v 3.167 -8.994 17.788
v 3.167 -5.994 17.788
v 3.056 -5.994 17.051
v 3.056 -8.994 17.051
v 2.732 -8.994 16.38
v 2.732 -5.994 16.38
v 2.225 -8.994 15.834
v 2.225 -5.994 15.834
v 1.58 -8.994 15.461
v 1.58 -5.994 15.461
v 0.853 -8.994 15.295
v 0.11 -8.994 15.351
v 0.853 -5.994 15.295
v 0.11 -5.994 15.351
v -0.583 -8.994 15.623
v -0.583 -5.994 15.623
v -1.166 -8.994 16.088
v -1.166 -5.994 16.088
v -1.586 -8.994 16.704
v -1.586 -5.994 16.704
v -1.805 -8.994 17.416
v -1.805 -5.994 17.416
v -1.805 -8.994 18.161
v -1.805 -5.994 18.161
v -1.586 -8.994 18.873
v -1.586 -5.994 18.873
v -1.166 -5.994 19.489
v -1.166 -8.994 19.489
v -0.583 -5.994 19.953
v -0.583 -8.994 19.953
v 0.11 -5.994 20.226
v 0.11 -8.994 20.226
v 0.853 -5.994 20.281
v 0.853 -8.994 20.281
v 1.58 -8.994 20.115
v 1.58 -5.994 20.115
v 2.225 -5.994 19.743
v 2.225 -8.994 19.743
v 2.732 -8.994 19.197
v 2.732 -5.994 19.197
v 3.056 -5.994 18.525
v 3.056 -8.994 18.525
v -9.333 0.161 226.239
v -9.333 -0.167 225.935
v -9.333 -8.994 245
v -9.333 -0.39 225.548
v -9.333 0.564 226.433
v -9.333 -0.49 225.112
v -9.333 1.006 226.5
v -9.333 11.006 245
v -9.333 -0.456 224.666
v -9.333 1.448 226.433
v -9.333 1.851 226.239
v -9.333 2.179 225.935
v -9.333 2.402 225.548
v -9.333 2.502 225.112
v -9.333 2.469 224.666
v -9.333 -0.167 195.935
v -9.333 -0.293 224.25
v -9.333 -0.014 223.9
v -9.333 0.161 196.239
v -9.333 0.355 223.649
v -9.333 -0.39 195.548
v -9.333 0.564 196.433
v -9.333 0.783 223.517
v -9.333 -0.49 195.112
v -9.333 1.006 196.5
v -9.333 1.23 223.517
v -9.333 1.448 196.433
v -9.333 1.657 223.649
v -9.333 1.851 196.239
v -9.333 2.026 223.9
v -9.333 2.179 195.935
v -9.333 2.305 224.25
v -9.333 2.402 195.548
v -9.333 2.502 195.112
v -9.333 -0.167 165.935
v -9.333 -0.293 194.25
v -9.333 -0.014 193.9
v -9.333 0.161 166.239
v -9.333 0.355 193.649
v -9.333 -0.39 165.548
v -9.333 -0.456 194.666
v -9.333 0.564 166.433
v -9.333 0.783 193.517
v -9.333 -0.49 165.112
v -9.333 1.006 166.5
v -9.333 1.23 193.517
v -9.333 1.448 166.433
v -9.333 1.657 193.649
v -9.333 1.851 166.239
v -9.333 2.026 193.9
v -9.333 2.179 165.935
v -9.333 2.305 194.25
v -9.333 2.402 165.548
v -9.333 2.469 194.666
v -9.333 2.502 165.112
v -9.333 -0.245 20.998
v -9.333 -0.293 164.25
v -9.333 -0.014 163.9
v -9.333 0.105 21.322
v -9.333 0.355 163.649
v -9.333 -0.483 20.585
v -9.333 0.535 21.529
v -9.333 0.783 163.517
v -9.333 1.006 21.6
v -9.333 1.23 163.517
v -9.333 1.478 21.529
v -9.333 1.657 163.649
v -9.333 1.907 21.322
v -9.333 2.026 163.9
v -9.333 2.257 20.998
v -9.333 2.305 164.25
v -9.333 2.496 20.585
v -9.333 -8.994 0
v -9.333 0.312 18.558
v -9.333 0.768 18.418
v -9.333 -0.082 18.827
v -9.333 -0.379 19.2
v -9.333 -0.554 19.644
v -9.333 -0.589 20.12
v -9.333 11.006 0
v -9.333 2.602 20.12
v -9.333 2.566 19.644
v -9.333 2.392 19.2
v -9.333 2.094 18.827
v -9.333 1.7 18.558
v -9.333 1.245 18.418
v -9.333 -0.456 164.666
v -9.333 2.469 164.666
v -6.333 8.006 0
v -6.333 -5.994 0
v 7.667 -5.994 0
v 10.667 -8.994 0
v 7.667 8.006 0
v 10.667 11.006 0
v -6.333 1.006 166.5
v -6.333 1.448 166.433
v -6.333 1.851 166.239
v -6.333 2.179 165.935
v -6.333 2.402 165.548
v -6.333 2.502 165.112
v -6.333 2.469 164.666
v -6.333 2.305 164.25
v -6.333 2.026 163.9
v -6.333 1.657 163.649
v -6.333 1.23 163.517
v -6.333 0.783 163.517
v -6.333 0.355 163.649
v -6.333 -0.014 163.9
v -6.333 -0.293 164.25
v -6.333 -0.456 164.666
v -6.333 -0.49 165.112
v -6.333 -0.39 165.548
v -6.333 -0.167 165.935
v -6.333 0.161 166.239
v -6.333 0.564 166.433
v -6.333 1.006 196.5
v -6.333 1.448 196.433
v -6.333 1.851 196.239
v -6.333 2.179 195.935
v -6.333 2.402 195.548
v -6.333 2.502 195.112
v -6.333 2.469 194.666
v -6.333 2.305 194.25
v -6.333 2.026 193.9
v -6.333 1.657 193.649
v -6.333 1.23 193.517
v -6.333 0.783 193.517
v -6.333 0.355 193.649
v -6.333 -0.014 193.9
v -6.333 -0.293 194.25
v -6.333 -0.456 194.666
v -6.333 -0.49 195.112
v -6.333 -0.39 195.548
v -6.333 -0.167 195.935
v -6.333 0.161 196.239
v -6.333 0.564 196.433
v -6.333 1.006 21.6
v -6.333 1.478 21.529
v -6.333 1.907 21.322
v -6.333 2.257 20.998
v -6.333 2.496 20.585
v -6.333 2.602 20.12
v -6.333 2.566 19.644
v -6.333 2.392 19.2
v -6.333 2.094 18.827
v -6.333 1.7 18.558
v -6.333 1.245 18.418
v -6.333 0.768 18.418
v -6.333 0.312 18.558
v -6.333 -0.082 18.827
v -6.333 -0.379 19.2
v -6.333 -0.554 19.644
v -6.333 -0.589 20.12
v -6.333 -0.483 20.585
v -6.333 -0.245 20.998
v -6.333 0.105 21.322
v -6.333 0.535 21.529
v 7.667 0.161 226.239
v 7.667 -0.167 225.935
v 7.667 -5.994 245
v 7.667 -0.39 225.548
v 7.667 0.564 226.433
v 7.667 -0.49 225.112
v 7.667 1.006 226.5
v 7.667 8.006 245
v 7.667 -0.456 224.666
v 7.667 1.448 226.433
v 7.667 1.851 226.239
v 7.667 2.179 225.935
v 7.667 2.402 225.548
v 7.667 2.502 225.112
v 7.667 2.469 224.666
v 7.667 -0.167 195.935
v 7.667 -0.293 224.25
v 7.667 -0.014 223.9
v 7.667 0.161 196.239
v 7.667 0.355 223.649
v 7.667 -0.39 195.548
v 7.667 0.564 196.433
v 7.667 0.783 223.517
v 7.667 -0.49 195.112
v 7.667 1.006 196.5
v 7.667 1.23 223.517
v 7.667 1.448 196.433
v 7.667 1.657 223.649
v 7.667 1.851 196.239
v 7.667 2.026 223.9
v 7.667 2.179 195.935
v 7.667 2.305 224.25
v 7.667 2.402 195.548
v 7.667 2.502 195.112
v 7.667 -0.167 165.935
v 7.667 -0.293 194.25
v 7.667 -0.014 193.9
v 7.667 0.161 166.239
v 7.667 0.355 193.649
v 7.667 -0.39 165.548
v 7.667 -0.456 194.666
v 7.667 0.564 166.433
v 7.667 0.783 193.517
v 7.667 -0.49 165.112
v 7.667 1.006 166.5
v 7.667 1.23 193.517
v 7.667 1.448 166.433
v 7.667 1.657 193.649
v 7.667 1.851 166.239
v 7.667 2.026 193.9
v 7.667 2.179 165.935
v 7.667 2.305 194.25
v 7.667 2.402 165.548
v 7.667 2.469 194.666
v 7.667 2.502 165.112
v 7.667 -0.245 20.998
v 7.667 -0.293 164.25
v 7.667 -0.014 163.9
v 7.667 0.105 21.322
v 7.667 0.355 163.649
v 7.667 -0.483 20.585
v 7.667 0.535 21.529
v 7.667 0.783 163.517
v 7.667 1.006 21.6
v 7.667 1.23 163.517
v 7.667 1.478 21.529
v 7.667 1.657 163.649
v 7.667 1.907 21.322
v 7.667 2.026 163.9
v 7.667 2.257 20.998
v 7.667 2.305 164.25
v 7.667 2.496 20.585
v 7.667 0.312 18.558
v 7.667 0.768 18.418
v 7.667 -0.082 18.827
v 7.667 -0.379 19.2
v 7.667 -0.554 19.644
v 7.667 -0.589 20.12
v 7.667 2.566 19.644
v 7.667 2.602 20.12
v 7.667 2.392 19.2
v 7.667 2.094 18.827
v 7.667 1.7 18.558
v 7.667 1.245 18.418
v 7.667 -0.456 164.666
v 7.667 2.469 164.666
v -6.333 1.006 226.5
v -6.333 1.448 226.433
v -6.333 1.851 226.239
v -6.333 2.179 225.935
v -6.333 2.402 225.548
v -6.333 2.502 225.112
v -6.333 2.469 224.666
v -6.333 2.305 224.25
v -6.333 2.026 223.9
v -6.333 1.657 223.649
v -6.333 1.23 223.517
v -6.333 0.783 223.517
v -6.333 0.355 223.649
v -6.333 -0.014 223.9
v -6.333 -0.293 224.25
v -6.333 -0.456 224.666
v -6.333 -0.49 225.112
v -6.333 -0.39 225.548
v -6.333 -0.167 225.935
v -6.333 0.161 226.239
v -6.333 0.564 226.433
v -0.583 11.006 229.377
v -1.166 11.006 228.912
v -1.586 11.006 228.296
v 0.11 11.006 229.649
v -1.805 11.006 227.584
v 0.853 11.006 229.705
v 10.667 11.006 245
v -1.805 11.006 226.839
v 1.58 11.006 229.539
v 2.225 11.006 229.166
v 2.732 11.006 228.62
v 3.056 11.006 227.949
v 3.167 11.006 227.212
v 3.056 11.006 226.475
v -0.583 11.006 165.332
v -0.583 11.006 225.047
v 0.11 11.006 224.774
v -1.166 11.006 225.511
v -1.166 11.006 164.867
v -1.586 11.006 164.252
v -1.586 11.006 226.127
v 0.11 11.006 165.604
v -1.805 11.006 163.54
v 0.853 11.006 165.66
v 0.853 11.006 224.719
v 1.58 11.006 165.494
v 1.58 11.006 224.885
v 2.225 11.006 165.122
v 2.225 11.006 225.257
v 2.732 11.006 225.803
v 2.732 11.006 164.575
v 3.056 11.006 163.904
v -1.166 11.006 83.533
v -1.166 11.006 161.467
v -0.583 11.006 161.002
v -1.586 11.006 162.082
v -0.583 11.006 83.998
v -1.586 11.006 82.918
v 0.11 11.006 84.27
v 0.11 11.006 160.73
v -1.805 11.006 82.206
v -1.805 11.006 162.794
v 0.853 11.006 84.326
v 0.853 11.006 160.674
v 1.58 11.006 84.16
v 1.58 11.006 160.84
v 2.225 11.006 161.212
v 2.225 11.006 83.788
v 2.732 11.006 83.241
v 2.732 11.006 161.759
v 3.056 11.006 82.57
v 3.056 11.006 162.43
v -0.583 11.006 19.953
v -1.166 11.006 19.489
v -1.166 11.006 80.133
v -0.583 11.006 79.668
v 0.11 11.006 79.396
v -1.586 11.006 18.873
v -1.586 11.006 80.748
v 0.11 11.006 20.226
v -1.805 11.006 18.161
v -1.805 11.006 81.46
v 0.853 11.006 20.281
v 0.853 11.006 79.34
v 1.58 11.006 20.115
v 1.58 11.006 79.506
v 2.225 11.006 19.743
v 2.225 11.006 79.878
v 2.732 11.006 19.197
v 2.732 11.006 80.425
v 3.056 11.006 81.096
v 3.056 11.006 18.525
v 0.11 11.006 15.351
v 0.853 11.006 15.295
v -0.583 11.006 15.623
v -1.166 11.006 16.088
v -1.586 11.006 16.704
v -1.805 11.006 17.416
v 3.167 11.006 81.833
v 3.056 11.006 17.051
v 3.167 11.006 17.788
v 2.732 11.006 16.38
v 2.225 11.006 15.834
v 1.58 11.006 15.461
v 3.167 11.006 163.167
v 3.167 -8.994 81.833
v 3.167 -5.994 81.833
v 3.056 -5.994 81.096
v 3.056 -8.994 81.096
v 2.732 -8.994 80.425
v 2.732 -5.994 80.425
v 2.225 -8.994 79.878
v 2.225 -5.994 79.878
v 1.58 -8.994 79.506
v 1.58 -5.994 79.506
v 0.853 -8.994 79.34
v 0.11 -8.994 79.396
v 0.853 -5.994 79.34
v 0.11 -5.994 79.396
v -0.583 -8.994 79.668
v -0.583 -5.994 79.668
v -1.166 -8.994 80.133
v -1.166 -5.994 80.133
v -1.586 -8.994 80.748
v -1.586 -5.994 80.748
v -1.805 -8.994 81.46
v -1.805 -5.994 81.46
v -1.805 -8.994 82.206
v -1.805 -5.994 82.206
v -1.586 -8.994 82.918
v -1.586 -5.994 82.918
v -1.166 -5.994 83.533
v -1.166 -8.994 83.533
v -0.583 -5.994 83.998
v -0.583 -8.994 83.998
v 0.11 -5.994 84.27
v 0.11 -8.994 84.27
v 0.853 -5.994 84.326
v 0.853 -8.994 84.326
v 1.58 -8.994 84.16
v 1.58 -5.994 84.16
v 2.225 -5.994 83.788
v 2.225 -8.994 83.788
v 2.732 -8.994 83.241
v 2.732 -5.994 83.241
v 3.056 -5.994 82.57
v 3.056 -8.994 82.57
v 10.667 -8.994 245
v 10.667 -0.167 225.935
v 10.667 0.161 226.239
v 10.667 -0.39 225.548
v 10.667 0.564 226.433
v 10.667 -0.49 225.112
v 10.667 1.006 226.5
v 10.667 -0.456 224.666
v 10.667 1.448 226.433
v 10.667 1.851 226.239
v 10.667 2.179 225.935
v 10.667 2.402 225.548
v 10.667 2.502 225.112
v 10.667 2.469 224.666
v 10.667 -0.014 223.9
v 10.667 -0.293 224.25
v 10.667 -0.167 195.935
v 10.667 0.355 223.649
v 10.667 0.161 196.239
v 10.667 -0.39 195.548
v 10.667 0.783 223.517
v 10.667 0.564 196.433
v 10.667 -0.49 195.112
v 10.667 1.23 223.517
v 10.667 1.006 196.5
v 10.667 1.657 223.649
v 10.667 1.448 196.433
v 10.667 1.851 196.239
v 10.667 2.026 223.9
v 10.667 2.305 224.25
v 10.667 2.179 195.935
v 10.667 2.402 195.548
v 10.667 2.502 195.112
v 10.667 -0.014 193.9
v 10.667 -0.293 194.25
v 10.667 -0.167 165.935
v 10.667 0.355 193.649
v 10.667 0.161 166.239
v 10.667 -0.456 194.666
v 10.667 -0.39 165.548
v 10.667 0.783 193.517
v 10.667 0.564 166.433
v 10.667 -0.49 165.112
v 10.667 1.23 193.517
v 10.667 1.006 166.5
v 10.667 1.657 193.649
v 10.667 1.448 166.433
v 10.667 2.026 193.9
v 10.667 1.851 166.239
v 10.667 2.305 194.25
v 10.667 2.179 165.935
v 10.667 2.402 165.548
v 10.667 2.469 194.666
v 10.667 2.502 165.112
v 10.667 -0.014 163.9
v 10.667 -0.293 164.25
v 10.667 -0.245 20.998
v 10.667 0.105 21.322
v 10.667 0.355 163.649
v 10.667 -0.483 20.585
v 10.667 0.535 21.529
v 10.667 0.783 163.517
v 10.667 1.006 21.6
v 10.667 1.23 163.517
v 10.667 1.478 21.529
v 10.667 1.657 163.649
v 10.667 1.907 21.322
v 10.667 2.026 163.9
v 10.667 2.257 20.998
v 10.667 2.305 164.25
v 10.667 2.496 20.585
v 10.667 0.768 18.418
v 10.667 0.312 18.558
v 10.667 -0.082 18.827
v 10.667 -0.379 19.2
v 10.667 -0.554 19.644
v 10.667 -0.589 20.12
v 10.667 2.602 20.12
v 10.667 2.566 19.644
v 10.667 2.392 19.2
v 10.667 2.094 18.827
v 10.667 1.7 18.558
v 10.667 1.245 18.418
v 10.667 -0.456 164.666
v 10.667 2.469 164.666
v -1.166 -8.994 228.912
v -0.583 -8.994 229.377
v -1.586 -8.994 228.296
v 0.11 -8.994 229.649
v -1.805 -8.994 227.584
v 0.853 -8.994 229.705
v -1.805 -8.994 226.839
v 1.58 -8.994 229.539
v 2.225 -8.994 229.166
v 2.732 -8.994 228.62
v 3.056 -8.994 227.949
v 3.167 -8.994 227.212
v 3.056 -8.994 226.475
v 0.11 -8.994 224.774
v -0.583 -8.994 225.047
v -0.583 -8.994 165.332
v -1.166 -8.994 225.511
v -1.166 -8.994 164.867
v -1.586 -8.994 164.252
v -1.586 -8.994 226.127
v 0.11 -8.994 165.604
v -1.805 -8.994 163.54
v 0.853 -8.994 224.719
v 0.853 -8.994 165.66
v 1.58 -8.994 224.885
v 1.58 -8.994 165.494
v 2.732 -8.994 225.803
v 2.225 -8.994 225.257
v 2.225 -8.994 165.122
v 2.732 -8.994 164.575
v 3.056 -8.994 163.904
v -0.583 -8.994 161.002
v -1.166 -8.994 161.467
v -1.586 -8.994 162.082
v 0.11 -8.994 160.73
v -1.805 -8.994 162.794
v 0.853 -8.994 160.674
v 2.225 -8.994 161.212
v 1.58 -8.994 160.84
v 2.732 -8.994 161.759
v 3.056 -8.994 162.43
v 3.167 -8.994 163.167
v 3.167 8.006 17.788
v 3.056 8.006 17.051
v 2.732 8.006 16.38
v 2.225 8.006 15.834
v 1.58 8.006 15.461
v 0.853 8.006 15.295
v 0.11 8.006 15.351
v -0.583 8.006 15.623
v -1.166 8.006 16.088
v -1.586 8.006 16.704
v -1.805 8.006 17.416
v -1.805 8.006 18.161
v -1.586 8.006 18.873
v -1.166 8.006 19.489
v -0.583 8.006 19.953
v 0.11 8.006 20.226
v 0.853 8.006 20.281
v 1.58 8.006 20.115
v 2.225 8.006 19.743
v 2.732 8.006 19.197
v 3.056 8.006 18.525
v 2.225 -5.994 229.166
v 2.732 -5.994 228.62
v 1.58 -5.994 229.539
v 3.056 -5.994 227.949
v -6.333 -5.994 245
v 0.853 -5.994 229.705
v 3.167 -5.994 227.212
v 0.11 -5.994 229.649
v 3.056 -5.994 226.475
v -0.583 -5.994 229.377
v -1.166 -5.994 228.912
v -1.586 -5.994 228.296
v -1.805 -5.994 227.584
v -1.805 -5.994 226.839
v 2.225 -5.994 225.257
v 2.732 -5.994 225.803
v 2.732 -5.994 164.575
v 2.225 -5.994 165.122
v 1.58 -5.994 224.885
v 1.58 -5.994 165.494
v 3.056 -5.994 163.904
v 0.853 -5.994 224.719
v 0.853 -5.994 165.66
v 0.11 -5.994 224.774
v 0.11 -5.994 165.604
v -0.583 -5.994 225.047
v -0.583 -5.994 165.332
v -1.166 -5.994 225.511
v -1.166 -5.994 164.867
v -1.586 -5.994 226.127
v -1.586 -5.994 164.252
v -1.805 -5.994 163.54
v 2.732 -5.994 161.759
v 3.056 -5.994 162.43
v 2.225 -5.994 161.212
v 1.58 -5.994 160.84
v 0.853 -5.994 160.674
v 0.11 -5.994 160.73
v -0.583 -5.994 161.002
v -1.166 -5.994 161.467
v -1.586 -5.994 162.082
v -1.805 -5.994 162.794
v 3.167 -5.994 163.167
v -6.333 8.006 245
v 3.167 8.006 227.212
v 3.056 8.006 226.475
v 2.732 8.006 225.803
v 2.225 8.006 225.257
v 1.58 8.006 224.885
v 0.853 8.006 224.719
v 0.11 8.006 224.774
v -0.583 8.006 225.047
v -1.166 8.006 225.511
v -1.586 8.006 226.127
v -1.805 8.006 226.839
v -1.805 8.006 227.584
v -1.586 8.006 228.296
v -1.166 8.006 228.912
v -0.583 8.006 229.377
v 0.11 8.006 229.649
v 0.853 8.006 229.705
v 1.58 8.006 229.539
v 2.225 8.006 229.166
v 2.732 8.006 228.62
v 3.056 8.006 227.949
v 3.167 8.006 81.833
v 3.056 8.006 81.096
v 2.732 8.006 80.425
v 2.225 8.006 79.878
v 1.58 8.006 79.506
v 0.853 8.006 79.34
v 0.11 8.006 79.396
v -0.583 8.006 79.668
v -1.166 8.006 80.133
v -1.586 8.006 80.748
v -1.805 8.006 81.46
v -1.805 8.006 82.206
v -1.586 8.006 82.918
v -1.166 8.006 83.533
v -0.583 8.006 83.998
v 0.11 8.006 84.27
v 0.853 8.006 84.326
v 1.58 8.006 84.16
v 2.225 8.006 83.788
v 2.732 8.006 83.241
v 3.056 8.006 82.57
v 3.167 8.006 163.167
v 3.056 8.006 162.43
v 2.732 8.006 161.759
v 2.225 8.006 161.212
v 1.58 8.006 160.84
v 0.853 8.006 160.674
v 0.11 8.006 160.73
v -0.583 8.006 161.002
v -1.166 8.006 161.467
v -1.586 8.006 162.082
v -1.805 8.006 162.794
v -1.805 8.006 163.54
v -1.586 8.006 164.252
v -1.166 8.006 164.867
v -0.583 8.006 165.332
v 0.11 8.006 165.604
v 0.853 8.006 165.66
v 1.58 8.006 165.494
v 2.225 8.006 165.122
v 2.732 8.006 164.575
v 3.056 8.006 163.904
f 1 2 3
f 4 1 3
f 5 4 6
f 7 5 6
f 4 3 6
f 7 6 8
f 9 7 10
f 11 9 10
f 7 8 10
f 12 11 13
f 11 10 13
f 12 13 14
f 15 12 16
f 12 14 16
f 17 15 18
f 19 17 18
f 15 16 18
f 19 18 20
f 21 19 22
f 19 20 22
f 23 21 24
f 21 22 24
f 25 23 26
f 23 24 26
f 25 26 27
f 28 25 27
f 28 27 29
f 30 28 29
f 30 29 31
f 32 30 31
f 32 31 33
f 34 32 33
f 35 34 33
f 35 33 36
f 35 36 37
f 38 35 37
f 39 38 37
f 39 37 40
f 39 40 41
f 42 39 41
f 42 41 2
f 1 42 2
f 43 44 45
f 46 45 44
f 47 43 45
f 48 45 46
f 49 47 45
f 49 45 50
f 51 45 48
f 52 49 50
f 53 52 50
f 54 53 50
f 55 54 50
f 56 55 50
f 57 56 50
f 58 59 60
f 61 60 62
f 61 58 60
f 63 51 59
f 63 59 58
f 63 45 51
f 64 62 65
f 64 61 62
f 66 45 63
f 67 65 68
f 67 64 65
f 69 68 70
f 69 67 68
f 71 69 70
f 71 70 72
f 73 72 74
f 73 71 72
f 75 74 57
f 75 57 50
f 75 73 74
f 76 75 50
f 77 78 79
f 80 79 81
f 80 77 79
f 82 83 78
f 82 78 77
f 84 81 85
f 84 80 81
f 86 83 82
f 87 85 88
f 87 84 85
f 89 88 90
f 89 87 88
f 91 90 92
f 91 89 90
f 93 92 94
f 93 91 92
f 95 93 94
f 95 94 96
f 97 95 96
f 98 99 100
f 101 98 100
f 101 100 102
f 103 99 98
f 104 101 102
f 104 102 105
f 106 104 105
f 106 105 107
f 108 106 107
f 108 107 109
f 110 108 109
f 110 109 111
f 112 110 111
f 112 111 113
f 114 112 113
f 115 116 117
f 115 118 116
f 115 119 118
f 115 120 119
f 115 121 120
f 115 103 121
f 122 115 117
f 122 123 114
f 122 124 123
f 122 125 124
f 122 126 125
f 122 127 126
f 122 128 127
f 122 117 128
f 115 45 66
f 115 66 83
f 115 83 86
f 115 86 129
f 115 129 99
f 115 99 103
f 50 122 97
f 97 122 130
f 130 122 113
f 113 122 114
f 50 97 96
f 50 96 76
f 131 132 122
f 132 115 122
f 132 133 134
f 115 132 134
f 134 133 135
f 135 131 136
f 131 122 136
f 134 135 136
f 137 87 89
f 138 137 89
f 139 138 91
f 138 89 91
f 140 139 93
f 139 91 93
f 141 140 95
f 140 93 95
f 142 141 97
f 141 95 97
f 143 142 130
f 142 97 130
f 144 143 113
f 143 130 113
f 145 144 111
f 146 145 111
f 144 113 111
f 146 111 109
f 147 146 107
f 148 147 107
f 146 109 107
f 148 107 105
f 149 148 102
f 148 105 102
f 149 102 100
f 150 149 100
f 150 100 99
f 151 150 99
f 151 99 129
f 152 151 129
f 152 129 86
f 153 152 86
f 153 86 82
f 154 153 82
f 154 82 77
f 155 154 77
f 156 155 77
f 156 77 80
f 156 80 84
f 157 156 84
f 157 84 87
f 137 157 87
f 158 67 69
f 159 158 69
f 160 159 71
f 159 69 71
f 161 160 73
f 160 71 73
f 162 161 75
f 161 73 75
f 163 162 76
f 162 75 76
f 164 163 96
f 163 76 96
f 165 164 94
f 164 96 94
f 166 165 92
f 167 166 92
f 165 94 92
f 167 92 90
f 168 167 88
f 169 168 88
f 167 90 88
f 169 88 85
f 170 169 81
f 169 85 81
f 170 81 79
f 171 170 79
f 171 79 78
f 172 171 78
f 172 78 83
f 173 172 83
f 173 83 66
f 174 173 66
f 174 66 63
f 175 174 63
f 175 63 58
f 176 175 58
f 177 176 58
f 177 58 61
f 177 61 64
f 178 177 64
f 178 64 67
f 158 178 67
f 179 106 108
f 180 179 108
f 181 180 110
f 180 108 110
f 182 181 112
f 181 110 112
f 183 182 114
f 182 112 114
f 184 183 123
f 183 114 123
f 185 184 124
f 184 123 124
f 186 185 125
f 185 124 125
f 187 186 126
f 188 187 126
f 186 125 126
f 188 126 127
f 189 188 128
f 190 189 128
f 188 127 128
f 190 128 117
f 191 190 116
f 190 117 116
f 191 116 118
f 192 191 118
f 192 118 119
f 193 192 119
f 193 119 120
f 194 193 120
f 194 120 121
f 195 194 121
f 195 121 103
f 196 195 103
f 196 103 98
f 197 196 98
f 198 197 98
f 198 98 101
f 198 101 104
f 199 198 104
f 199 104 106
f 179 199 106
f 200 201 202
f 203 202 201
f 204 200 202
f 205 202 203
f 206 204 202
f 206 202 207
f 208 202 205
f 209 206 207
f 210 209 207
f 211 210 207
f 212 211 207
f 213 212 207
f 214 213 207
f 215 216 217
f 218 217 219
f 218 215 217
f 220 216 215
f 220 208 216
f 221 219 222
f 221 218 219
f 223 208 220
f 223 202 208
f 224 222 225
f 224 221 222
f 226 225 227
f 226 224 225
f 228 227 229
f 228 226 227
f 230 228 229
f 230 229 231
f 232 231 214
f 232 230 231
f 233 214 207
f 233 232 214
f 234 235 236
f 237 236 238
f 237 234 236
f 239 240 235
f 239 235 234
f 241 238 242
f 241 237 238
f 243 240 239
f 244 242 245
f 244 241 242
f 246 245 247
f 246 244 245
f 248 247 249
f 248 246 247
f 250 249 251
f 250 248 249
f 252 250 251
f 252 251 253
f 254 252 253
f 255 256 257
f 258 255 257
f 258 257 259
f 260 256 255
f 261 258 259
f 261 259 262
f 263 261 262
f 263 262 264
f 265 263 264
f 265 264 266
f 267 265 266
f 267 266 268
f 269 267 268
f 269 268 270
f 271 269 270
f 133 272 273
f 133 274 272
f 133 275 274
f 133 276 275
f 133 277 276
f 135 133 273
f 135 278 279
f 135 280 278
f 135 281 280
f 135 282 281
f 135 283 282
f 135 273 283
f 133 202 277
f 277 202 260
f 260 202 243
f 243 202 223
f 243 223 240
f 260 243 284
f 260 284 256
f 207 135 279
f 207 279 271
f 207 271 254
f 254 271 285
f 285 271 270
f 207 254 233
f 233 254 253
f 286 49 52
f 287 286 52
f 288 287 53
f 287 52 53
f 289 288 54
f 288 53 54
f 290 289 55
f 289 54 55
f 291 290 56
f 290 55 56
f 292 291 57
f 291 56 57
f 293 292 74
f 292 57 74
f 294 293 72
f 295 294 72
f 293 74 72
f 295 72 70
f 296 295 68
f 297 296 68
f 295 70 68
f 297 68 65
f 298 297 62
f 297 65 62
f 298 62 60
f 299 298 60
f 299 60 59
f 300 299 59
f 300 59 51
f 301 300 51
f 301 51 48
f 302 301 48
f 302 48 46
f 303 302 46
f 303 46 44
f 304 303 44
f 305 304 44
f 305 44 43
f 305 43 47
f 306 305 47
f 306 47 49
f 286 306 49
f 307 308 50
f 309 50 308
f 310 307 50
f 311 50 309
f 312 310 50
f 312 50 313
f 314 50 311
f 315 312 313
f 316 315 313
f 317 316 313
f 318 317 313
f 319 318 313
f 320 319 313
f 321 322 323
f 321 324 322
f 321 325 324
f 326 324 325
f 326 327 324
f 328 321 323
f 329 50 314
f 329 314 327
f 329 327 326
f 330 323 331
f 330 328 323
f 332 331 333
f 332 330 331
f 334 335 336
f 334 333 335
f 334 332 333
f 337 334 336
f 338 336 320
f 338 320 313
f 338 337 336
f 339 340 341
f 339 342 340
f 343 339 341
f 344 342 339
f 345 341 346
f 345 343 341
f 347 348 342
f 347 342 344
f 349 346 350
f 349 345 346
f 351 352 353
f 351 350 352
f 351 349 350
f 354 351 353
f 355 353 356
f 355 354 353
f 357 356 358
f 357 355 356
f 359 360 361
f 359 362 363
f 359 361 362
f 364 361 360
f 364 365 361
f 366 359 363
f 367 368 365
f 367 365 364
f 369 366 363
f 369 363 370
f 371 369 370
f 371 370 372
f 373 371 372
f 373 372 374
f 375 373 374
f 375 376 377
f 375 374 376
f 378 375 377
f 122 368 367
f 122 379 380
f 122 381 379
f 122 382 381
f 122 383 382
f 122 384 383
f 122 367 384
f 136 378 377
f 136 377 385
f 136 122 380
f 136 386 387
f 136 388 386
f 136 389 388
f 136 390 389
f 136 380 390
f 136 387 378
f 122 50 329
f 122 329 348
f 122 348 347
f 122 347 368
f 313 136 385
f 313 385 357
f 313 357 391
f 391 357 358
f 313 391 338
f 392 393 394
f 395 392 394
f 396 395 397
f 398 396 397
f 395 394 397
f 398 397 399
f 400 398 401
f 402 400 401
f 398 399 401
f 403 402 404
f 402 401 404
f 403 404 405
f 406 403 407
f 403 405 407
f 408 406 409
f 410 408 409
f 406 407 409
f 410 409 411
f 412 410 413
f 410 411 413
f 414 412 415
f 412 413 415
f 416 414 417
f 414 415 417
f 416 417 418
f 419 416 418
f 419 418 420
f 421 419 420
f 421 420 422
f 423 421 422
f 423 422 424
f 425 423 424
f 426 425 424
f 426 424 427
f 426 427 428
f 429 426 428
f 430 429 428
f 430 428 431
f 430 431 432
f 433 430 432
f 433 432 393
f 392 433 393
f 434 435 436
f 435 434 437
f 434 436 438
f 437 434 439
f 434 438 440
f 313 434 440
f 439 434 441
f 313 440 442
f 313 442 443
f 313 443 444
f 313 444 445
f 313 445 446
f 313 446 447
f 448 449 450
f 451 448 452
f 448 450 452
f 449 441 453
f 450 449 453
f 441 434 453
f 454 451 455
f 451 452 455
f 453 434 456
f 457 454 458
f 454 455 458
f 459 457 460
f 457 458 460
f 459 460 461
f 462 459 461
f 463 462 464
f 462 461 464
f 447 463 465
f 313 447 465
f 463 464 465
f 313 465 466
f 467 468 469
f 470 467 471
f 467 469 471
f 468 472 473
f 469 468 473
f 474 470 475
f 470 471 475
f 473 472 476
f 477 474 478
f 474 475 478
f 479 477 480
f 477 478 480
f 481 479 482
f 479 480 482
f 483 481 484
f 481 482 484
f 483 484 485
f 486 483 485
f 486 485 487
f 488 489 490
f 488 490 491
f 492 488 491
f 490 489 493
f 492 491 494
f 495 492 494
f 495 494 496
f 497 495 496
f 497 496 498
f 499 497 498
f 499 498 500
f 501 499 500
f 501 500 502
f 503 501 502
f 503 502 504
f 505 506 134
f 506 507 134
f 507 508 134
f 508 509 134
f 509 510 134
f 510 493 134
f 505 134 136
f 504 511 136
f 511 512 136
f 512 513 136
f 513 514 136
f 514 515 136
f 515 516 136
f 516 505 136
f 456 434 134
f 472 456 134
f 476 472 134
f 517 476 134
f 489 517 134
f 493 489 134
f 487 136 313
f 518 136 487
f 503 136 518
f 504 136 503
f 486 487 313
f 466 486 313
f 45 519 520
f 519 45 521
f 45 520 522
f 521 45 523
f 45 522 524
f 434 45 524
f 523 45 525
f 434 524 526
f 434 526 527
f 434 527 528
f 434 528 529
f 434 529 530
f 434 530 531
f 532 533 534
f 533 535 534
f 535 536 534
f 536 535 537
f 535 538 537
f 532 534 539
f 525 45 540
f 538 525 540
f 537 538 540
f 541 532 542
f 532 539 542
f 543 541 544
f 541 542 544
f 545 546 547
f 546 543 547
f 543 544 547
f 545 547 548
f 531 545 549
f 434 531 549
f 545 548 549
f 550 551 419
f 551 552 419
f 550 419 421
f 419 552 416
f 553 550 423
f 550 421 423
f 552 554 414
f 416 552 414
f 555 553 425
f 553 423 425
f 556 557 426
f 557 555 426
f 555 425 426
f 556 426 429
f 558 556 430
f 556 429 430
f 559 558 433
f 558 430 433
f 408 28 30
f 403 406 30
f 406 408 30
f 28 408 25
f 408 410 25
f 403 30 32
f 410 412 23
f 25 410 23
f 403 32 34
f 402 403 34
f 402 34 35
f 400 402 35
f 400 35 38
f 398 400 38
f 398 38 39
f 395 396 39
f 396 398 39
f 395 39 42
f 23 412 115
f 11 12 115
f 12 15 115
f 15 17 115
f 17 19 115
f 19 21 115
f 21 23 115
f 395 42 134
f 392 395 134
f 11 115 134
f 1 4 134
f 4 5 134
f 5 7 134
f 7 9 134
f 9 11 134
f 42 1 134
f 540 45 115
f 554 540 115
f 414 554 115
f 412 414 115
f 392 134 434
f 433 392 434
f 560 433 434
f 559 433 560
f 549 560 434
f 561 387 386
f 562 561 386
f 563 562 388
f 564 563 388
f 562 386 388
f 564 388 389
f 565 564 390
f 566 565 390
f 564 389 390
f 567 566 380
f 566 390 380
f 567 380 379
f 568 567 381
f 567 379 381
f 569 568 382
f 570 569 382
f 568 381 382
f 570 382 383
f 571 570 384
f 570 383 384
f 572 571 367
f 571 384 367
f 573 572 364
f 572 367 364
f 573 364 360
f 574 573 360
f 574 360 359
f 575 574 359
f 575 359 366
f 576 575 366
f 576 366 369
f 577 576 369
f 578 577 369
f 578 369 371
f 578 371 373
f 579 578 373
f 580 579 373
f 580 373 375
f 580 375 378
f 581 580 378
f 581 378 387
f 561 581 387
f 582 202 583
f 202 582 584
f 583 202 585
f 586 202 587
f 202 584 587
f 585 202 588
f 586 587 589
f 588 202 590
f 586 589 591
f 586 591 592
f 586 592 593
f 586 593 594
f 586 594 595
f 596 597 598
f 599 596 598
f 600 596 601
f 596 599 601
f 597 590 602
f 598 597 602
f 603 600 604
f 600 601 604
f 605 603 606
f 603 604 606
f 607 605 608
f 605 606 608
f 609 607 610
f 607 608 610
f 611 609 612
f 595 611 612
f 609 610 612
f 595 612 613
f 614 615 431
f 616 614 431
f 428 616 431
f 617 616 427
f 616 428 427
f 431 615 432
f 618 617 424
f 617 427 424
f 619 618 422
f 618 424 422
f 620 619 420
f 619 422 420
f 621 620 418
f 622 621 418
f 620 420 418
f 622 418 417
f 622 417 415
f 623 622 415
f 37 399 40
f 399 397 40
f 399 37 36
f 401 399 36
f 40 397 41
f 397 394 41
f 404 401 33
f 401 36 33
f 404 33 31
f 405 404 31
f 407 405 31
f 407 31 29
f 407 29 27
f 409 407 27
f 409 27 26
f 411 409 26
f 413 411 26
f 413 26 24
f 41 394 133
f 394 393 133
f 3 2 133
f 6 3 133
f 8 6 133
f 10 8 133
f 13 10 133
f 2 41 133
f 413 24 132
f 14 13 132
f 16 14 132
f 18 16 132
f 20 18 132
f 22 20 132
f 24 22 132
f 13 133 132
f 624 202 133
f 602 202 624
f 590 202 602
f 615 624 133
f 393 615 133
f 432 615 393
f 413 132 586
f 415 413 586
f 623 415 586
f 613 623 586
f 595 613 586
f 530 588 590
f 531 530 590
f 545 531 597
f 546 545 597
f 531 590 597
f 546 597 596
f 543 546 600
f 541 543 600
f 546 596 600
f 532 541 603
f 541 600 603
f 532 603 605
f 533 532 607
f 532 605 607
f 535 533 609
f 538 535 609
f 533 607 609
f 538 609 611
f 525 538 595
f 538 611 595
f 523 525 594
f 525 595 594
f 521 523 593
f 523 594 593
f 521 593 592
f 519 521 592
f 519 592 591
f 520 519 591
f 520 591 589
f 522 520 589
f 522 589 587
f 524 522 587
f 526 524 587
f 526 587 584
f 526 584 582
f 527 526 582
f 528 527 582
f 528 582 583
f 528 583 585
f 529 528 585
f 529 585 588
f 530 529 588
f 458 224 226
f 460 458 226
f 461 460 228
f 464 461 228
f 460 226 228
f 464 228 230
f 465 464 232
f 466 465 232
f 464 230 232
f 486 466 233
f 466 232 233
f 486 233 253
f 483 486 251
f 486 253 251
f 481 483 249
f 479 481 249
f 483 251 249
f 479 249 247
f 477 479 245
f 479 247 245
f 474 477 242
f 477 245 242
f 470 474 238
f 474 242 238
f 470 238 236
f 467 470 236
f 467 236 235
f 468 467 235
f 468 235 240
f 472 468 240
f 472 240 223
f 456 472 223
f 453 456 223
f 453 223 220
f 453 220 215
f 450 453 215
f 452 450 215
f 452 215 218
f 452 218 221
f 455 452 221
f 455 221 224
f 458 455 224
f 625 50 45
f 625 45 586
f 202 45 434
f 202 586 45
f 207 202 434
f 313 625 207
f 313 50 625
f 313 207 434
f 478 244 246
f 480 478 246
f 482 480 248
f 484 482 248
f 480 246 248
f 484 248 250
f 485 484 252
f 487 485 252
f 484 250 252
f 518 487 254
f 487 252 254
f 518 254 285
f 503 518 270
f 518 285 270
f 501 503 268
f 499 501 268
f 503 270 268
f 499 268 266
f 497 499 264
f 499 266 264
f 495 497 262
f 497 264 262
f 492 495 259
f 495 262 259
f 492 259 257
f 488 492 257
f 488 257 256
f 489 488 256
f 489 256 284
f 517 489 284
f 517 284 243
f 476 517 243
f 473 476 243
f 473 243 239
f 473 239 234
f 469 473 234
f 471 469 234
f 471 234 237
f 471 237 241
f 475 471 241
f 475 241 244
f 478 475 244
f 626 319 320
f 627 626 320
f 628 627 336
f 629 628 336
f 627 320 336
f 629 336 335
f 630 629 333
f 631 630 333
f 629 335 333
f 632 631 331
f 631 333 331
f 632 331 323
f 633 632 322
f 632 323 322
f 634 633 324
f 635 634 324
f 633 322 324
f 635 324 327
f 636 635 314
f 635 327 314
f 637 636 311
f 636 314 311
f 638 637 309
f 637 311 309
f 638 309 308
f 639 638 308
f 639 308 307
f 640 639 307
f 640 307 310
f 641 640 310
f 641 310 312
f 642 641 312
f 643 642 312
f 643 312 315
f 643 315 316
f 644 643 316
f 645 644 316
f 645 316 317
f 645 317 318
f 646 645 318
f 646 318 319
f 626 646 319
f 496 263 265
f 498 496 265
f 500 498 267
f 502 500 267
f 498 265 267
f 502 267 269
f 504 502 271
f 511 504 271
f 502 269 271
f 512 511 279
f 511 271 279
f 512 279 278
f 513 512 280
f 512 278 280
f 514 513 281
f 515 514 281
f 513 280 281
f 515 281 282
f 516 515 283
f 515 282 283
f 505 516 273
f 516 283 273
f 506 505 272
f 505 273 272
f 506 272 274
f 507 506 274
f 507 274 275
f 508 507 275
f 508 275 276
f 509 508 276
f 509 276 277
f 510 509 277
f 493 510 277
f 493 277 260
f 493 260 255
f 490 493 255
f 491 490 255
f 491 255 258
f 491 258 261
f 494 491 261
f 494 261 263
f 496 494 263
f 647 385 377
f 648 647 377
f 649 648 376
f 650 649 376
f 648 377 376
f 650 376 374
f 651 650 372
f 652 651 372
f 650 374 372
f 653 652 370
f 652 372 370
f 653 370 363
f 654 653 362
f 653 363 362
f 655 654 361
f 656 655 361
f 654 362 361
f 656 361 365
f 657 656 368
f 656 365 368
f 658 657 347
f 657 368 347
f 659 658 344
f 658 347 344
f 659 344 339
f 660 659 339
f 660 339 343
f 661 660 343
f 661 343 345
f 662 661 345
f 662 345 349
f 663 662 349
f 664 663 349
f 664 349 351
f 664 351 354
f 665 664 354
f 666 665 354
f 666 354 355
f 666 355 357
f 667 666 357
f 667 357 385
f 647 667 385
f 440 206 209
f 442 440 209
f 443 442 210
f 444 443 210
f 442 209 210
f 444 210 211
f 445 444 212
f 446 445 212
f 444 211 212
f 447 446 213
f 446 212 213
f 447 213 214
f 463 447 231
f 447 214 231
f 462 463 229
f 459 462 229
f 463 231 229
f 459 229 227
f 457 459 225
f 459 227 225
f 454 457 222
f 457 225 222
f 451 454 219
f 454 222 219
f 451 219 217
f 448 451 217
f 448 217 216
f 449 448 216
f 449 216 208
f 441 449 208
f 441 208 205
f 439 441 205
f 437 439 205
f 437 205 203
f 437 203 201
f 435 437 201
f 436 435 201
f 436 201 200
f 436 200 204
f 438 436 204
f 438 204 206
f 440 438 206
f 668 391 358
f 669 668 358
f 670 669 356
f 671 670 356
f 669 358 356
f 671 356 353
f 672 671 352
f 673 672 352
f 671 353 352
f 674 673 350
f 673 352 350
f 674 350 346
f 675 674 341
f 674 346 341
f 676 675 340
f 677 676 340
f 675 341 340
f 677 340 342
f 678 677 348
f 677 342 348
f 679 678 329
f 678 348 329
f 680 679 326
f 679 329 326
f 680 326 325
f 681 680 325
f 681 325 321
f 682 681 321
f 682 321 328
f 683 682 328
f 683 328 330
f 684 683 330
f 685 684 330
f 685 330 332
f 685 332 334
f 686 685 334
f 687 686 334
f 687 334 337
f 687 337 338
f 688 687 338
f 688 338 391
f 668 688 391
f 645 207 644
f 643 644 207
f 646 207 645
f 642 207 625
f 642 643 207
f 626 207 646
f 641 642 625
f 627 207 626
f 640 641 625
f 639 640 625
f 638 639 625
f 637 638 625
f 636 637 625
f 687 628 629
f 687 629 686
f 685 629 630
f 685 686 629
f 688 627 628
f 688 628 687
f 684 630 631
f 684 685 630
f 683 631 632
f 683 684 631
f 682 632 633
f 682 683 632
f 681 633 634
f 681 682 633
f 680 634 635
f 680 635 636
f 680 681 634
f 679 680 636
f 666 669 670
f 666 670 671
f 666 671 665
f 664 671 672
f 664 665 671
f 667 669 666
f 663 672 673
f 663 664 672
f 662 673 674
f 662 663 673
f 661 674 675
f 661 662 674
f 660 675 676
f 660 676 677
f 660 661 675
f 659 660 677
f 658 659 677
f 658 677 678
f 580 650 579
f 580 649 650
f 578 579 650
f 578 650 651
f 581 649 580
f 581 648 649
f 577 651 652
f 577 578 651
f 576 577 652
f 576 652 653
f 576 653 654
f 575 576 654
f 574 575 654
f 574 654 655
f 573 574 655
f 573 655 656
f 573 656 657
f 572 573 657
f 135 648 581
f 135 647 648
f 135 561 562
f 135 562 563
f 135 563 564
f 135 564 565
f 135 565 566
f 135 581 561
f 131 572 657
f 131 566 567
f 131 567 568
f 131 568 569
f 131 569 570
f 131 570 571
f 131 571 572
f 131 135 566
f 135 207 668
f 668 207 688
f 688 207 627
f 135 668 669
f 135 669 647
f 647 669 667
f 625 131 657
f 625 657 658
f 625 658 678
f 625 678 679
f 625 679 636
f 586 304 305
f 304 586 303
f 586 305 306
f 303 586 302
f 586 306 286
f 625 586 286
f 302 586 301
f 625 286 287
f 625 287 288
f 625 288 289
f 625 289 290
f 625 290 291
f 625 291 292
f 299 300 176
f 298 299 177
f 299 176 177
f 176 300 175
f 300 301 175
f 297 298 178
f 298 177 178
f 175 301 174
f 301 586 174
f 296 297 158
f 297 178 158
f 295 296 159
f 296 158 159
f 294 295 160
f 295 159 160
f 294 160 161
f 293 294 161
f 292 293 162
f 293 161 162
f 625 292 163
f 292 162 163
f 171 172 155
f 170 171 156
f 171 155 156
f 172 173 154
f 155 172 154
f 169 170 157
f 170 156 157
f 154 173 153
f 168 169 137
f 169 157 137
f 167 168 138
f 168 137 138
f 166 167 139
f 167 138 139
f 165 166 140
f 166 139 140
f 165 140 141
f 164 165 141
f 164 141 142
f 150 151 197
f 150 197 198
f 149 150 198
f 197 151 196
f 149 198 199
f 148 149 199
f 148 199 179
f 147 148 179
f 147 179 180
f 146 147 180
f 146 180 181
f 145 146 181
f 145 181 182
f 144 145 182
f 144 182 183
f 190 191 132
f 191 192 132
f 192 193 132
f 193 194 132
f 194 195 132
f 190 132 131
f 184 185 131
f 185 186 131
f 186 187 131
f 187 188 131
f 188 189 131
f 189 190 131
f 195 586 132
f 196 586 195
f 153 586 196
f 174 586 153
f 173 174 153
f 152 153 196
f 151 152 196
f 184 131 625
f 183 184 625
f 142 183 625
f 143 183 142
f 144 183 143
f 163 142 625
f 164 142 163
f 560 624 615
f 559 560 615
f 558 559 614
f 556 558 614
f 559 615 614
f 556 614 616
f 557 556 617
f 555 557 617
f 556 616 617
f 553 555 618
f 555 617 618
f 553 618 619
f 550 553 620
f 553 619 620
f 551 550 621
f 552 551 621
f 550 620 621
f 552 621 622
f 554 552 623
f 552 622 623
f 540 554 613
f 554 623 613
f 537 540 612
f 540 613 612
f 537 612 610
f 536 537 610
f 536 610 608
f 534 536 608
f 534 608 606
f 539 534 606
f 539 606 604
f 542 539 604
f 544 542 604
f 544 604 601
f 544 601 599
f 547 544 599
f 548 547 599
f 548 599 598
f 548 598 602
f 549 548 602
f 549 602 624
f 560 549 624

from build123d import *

# Parameters (mm, degrees)
SKETCH_1_W          = 20
SKETCH_1_H          = 20
EXTRUDE_1_DEPTH     = 245
SKETCH_2_W          = 14
SKETCH_2_H          = 14
CUT_EXTRUDE_1_DEPTH = 246
SKETCH_3_R          = 1.5
SKETCH_3_R_2        = 1.6
CUT_EXTRUDE_2_DEPTH = 80
SKETCH_4_R          = 2.5
CUT_EXTRUDE_3_DEPTH = 93


with BuildPart() as part:
    # 草图1 → 凸台-拉伸1 (new body)
    with BuildSketch(Plane.XY):
        with Locations((0.666666667, 1.006147649)):
            Rectangle(SKETCH_1_W, SKETCH_1_H)
    extrude(amount=EXTRUDE_1_DEPTH)

    # 草图2 → 切除-拉伸1 (cut, through all)
    with BuildSketch(Plane(origin=(0, 0, 0), x_dir=(-1, 0, 0), z_dir=(0, 0, -1))):
        with Locations((-0.666666667, 1.006147649)):
            Rectangle(SKETCH_2_W, SKETCH_2_H)
    extrude(amount=-CUT_EXTRUDE_1_DEPTH, mode=Mode.SUBTRACT)

    # 草图3 → 切除-拉伸2 (cut)
    with BuildSketch(Plane.ZY.offset(9.333333333)):
        with Locations((225, 1.006147649)):
            Circle(SKETCH_3_R)
        with Locations((195, 1.006147649)):
            Circle(SKETCH_3_R)
        with Locations((165, 1.006147649)):
            Circle(SKETCH_3_R)
        with Locations((20, 1.006147649)):
            Circle(SKETCH_3_R_2)
    extrude(amount=-CUT_EXTRUDE_2_DEPTH, mode=Mode.SUBTRACT)

    # 草图4 → 切除-拉伸3 (cut)
    with BuildSketch(Plane(origin=(0, 11.006147649, 0), x_dir=(1, 0, 0), z_dir=(0, 1, 0))):
        with Locations((0.666666667, -17.788232679)):
            Circle(SKETCH_4_R)
        with Locations((0.666666667, -81.833059371)):
            Circle(SKETCH_4_R)
        with Locations((0.666666667, -163.166940629)):
            Circle(SKETCH_4_R)
        with Locations((0.666666667, -227.211767321)):
            Circle(SKETCH_4_R)
    extrude(amount=-CUT_EXTRUDE_3_DEPTH, mode=Mode.SUBTRACT)


solid = part.part
